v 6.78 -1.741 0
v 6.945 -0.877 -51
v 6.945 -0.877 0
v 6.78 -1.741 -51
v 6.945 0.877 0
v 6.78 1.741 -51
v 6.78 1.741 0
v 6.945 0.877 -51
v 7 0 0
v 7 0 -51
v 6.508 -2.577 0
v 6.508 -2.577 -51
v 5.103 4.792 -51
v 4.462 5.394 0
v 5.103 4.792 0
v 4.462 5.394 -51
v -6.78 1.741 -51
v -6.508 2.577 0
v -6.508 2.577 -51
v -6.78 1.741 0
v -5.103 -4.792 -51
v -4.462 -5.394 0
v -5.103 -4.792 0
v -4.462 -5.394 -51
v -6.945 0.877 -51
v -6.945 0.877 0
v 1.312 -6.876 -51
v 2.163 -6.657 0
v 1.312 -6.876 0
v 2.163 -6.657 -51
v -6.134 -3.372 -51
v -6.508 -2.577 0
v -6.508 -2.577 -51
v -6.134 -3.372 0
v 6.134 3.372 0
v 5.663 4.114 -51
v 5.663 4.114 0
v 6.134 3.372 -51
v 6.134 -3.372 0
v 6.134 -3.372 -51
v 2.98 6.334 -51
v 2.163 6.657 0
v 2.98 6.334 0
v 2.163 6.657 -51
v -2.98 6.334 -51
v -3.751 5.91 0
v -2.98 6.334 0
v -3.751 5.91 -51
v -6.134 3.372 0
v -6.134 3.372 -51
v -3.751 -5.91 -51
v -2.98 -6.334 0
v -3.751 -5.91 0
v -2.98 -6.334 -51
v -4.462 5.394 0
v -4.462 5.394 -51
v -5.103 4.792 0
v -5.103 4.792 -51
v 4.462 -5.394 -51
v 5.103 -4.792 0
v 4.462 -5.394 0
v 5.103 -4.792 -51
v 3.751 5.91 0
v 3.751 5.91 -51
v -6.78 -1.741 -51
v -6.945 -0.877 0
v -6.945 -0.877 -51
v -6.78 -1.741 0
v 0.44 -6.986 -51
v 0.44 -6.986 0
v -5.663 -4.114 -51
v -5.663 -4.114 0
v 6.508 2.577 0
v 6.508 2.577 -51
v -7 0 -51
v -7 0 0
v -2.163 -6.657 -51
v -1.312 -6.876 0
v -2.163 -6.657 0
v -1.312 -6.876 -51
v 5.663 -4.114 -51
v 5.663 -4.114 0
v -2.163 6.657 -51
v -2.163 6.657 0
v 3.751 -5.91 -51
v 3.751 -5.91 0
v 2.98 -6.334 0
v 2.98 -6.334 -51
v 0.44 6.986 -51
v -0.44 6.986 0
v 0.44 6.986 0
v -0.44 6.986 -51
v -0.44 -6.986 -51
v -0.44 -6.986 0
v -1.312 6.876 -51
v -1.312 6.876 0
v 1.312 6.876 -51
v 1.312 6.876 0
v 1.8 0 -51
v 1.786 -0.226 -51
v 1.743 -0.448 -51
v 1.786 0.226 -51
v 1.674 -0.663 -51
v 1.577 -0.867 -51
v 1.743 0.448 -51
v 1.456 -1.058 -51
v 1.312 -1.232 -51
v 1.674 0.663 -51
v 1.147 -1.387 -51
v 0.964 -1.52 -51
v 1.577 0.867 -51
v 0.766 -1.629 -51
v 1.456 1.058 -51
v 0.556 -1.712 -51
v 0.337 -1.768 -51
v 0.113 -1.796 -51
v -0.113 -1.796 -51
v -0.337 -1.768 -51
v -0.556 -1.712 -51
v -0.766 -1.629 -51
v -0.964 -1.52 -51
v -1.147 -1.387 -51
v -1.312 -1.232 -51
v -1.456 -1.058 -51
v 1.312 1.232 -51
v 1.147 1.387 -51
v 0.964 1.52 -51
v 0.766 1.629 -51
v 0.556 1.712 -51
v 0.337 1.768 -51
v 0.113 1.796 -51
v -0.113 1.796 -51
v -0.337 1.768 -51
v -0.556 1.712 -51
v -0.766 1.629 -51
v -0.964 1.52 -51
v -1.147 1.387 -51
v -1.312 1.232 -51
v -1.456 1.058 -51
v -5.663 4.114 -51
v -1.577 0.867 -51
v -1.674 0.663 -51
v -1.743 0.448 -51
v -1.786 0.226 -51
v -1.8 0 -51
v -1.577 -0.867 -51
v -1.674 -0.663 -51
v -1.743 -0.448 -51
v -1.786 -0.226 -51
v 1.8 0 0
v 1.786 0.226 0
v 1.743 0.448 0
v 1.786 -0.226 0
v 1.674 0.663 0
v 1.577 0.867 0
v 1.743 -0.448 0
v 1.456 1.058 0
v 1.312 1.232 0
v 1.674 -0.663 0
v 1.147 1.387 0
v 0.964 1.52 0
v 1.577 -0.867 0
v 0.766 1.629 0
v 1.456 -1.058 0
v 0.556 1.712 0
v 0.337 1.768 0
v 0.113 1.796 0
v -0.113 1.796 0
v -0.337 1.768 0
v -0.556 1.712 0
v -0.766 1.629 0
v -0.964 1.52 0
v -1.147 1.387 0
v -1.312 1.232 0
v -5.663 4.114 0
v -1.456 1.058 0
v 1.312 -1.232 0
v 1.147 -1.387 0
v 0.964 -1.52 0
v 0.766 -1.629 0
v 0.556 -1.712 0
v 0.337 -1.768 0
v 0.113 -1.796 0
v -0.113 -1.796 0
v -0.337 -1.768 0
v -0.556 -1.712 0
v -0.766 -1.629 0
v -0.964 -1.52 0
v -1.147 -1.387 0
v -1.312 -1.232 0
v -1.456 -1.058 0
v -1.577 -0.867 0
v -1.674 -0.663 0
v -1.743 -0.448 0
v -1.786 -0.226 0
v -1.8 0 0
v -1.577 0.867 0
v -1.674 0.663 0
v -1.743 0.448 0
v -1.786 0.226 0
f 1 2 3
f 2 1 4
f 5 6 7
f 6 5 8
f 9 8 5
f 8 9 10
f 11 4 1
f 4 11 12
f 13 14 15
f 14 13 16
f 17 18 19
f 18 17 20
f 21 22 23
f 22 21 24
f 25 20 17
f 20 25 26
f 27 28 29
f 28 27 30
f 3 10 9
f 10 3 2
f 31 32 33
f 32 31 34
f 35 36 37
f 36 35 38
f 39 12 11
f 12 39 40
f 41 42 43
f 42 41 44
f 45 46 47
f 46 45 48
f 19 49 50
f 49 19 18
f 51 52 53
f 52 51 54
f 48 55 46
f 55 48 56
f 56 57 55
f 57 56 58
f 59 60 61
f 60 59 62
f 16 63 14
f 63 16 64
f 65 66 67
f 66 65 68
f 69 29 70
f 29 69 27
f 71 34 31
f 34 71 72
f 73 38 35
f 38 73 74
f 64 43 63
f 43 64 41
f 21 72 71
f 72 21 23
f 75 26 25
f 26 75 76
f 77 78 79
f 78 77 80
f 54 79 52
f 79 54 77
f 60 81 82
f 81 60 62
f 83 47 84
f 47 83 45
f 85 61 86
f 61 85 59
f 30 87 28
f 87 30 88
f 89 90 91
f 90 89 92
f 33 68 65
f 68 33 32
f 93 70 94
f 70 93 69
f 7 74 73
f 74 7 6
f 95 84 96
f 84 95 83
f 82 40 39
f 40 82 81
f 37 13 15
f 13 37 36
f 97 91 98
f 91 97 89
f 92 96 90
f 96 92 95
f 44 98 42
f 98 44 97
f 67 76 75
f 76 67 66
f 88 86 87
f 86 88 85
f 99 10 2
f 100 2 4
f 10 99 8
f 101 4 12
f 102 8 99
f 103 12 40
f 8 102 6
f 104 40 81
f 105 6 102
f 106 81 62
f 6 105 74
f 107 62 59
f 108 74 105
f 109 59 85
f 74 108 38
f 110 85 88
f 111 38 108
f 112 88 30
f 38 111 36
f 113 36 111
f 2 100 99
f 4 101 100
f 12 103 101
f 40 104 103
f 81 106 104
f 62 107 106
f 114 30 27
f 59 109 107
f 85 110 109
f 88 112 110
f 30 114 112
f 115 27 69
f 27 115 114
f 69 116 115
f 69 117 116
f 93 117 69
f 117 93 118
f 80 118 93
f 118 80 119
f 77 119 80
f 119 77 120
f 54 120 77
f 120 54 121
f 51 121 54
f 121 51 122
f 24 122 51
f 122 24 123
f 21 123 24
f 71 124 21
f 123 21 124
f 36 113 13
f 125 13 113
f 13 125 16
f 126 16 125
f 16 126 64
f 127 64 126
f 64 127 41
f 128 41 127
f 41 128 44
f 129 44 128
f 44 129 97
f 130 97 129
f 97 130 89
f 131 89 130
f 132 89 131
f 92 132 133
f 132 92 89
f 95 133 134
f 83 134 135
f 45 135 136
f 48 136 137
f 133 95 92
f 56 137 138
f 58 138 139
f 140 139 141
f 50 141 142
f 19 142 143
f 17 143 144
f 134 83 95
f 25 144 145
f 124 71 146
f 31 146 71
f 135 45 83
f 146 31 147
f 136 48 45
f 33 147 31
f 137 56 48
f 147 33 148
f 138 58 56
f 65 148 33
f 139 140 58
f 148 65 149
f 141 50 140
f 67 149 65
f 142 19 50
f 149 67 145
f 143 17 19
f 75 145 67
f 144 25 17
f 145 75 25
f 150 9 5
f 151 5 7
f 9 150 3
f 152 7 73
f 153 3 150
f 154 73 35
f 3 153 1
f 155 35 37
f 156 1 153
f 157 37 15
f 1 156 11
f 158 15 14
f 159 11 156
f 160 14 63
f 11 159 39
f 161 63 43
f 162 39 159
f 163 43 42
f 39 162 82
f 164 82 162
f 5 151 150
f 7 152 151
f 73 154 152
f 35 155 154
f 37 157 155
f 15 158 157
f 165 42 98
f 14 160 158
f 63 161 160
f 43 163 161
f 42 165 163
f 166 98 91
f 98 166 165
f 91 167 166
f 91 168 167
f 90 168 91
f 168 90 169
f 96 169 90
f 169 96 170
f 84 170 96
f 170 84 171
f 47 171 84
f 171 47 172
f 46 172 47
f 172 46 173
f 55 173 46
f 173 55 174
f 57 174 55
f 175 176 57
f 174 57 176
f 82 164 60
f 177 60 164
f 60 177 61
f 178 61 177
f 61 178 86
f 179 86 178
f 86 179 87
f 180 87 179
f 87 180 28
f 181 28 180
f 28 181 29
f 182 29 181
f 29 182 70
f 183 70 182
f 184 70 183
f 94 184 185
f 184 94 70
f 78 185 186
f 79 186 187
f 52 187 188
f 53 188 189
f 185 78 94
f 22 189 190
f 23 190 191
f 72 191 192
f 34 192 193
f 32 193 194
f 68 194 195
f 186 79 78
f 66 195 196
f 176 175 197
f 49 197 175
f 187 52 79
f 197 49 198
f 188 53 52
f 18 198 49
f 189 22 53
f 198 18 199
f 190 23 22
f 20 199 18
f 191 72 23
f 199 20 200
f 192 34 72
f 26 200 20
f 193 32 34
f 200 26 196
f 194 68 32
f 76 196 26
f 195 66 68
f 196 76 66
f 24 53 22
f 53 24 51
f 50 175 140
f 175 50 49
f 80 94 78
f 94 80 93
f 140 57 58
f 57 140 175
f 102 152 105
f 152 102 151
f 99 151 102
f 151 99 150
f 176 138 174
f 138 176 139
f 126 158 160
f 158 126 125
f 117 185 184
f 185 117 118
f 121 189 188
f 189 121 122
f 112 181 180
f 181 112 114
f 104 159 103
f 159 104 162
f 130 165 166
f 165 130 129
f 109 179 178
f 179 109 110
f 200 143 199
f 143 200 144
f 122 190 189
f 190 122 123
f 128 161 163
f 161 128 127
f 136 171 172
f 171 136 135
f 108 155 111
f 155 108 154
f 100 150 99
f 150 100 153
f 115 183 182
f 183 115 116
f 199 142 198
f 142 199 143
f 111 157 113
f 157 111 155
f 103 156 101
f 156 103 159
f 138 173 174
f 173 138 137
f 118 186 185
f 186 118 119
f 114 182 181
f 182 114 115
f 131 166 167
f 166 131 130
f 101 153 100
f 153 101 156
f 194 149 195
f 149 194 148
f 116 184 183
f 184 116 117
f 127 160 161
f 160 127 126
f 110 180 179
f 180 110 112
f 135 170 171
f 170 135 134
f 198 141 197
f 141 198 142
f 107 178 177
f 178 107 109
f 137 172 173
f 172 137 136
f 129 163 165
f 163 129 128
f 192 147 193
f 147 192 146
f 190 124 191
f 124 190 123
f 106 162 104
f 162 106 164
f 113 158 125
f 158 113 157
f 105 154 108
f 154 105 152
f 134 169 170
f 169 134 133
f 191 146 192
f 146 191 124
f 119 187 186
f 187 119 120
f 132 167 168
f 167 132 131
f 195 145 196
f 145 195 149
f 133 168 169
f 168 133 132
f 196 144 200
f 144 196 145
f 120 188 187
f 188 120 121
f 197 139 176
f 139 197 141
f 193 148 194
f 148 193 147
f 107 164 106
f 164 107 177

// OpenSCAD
$fn = 50;


difference() {
	union() {
		translate(v = [0, 0, -51.0000000000]) {
			cylinder(h = 51, r = 7.0000000000);
		}
	}
	union() {
		#translate(v = [0, 0, -51]) {
			cylinder(h = 51, r = 1.8000000000);
		}
	}
}
